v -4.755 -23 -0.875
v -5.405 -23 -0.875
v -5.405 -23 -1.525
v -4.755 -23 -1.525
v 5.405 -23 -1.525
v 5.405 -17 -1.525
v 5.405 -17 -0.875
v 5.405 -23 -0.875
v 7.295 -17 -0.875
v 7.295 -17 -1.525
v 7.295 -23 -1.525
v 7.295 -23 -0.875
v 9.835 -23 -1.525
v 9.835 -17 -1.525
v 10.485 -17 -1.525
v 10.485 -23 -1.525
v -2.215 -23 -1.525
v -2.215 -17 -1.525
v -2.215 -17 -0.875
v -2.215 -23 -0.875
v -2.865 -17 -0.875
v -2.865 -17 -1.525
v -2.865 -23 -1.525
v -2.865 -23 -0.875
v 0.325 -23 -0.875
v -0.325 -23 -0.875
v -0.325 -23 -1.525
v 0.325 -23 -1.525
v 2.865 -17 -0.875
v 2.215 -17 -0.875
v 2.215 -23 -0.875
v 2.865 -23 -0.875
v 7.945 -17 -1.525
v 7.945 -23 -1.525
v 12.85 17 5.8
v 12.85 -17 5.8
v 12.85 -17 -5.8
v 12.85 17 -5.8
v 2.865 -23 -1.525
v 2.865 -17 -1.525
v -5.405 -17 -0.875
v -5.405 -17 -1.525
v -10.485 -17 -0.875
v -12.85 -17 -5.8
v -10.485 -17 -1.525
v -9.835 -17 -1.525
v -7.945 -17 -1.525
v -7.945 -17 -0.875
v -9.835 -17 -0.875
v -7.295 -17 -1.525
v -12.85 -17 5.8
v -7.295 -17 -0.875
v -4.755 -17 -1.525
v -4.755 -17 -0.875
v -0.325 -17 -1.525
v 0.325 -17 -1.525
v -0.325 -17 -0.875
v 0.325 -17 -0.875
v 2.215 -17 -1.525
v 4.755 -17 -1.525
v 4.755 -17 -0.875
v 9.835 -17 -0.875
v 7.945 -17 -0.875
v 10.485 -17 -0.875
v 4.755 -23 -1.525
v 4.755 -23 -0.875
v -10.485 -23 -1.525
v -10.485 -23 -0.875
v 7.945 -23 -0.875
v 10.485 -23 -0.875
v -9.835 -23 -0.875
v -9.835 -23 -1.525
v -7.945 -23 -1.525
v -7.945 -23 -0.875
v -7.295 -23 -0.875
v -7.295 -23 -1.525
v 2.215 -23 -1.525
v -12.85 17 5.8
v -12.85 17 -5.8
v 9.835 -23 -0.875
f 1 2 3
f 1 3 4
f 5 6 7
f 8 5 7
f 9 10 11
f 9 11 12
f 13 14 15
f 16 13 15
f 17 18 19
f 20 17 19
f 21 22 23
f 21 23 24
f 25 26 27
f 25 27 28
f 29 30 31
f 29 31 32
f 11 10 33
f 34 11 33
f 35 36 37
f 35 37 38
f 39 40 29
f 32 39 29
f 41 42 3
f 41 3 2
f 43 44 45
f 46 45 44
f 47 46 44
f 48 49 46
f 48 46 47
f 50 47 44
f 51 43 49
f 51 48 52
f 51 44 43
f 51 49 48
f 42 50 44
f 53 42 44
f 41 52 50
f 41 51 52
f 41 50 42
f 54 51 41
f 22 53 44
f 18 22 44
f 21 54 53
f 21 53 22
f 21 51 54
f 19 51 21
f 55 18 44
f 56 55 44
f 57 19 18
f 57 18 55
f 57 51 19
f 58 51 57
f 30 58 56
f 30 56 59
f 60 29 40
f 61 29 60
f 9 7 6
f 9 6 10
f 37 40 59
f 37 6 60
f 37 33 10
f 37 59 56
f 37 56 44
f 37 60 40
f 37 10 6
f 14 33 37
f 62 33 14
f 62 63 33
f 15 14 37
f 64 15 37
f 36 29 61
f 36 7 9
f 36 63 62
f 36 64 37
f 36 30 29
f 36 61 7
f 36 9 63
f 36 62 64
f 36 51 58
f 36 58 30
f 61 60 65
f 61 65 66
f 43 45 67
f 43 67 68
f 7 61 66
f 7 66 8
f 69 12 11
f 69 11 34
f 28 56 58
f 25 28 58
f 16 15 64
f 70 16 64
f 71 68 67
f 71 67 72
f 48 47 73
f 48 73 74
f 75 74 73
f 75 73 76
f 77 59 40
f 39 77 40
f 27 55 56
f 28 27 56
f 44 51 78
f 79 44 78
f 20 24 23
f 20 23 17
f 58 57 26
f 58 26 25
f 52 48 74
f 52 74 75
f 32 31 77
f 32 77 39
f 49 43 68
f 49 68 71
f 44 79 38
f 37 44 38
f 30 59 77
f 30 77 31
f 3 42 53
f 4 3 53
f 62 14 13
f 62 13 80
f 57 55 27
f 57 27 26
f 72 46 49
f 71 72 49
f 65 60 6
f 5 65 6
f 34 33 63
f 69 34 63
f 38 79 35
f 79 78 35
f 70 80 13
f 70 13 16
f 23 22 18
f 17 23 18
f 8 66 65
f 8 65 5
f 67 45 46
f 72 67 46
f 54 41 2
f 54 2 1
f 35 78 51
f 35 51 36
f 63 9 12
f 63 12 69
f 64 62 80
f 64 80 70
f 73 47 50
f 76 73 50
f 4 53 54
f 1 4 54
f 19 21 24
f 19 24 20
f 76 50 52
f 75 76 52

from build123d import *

# Parameters (mm, degrees)
ESQUISSE1_W                    = 25.7
ESQUISSE1_H                    = 34
BOSS_EXTRU_1_DEPTH             = 5.8
ESQUISSE2_W                    = 0.65
ESQUISSE2_H                    = 0.65
BOSS_EXTRU_2_DEPTH             = 6
R_P_TITION_LIN_AIRE1_COUNT     = 5
R_P_TITION_LIN_AIRE1_PITCH     = 2.54
R_P_TITION_LIN_AIRE1_COL_COUNT = 5
R_P_TITION_LIN_AIRE1_COL_PITCH = 2.54


with BuildPart() as part:
    # Esquisse1 → Boss.-Extru.1 (new, symmetric)
    with BuildSketch(Plane.XY):
        Rectangle(ESQUISSE1_W, ESQUISSE1_H)
    extrude(amount=BOSS_EXTRU_1_DEPTH, both=True)

    # Esquisse2 → Boss.-Extru.2 (add)
    with BuildSketch(Plane.XZ.offset(17)):
        with Locations((0, -1.2)):
            Rectangle(ESQUISSE2_W, ESQUISSE2_H)
    boss_extru_2 = extrude(amount=BOSS_EXTRU_2_DEPTH)

    # Répétition linéaire1: Boss.-Extru.2 ×5
    with Locations(*[(i * R_P_TITION_LIN_AIRE1_PITCH, 0, 0) for i in range(1, R_P_TITION_LIN_AIRE1_COUNT)]):
        add(boss_extru_2)

    # Répétition linéaire1 col: Boss.-Extru.2 ×5
    with Locations(*[(-i * R_P_TITION_LIN_AIRE1_COL_PITCH, 0, 0) for i in range(1, R_P_TITION_LIN_AIRE1_COL_COUNT)]):
        add(boss_extru_2)


solid = part.part
